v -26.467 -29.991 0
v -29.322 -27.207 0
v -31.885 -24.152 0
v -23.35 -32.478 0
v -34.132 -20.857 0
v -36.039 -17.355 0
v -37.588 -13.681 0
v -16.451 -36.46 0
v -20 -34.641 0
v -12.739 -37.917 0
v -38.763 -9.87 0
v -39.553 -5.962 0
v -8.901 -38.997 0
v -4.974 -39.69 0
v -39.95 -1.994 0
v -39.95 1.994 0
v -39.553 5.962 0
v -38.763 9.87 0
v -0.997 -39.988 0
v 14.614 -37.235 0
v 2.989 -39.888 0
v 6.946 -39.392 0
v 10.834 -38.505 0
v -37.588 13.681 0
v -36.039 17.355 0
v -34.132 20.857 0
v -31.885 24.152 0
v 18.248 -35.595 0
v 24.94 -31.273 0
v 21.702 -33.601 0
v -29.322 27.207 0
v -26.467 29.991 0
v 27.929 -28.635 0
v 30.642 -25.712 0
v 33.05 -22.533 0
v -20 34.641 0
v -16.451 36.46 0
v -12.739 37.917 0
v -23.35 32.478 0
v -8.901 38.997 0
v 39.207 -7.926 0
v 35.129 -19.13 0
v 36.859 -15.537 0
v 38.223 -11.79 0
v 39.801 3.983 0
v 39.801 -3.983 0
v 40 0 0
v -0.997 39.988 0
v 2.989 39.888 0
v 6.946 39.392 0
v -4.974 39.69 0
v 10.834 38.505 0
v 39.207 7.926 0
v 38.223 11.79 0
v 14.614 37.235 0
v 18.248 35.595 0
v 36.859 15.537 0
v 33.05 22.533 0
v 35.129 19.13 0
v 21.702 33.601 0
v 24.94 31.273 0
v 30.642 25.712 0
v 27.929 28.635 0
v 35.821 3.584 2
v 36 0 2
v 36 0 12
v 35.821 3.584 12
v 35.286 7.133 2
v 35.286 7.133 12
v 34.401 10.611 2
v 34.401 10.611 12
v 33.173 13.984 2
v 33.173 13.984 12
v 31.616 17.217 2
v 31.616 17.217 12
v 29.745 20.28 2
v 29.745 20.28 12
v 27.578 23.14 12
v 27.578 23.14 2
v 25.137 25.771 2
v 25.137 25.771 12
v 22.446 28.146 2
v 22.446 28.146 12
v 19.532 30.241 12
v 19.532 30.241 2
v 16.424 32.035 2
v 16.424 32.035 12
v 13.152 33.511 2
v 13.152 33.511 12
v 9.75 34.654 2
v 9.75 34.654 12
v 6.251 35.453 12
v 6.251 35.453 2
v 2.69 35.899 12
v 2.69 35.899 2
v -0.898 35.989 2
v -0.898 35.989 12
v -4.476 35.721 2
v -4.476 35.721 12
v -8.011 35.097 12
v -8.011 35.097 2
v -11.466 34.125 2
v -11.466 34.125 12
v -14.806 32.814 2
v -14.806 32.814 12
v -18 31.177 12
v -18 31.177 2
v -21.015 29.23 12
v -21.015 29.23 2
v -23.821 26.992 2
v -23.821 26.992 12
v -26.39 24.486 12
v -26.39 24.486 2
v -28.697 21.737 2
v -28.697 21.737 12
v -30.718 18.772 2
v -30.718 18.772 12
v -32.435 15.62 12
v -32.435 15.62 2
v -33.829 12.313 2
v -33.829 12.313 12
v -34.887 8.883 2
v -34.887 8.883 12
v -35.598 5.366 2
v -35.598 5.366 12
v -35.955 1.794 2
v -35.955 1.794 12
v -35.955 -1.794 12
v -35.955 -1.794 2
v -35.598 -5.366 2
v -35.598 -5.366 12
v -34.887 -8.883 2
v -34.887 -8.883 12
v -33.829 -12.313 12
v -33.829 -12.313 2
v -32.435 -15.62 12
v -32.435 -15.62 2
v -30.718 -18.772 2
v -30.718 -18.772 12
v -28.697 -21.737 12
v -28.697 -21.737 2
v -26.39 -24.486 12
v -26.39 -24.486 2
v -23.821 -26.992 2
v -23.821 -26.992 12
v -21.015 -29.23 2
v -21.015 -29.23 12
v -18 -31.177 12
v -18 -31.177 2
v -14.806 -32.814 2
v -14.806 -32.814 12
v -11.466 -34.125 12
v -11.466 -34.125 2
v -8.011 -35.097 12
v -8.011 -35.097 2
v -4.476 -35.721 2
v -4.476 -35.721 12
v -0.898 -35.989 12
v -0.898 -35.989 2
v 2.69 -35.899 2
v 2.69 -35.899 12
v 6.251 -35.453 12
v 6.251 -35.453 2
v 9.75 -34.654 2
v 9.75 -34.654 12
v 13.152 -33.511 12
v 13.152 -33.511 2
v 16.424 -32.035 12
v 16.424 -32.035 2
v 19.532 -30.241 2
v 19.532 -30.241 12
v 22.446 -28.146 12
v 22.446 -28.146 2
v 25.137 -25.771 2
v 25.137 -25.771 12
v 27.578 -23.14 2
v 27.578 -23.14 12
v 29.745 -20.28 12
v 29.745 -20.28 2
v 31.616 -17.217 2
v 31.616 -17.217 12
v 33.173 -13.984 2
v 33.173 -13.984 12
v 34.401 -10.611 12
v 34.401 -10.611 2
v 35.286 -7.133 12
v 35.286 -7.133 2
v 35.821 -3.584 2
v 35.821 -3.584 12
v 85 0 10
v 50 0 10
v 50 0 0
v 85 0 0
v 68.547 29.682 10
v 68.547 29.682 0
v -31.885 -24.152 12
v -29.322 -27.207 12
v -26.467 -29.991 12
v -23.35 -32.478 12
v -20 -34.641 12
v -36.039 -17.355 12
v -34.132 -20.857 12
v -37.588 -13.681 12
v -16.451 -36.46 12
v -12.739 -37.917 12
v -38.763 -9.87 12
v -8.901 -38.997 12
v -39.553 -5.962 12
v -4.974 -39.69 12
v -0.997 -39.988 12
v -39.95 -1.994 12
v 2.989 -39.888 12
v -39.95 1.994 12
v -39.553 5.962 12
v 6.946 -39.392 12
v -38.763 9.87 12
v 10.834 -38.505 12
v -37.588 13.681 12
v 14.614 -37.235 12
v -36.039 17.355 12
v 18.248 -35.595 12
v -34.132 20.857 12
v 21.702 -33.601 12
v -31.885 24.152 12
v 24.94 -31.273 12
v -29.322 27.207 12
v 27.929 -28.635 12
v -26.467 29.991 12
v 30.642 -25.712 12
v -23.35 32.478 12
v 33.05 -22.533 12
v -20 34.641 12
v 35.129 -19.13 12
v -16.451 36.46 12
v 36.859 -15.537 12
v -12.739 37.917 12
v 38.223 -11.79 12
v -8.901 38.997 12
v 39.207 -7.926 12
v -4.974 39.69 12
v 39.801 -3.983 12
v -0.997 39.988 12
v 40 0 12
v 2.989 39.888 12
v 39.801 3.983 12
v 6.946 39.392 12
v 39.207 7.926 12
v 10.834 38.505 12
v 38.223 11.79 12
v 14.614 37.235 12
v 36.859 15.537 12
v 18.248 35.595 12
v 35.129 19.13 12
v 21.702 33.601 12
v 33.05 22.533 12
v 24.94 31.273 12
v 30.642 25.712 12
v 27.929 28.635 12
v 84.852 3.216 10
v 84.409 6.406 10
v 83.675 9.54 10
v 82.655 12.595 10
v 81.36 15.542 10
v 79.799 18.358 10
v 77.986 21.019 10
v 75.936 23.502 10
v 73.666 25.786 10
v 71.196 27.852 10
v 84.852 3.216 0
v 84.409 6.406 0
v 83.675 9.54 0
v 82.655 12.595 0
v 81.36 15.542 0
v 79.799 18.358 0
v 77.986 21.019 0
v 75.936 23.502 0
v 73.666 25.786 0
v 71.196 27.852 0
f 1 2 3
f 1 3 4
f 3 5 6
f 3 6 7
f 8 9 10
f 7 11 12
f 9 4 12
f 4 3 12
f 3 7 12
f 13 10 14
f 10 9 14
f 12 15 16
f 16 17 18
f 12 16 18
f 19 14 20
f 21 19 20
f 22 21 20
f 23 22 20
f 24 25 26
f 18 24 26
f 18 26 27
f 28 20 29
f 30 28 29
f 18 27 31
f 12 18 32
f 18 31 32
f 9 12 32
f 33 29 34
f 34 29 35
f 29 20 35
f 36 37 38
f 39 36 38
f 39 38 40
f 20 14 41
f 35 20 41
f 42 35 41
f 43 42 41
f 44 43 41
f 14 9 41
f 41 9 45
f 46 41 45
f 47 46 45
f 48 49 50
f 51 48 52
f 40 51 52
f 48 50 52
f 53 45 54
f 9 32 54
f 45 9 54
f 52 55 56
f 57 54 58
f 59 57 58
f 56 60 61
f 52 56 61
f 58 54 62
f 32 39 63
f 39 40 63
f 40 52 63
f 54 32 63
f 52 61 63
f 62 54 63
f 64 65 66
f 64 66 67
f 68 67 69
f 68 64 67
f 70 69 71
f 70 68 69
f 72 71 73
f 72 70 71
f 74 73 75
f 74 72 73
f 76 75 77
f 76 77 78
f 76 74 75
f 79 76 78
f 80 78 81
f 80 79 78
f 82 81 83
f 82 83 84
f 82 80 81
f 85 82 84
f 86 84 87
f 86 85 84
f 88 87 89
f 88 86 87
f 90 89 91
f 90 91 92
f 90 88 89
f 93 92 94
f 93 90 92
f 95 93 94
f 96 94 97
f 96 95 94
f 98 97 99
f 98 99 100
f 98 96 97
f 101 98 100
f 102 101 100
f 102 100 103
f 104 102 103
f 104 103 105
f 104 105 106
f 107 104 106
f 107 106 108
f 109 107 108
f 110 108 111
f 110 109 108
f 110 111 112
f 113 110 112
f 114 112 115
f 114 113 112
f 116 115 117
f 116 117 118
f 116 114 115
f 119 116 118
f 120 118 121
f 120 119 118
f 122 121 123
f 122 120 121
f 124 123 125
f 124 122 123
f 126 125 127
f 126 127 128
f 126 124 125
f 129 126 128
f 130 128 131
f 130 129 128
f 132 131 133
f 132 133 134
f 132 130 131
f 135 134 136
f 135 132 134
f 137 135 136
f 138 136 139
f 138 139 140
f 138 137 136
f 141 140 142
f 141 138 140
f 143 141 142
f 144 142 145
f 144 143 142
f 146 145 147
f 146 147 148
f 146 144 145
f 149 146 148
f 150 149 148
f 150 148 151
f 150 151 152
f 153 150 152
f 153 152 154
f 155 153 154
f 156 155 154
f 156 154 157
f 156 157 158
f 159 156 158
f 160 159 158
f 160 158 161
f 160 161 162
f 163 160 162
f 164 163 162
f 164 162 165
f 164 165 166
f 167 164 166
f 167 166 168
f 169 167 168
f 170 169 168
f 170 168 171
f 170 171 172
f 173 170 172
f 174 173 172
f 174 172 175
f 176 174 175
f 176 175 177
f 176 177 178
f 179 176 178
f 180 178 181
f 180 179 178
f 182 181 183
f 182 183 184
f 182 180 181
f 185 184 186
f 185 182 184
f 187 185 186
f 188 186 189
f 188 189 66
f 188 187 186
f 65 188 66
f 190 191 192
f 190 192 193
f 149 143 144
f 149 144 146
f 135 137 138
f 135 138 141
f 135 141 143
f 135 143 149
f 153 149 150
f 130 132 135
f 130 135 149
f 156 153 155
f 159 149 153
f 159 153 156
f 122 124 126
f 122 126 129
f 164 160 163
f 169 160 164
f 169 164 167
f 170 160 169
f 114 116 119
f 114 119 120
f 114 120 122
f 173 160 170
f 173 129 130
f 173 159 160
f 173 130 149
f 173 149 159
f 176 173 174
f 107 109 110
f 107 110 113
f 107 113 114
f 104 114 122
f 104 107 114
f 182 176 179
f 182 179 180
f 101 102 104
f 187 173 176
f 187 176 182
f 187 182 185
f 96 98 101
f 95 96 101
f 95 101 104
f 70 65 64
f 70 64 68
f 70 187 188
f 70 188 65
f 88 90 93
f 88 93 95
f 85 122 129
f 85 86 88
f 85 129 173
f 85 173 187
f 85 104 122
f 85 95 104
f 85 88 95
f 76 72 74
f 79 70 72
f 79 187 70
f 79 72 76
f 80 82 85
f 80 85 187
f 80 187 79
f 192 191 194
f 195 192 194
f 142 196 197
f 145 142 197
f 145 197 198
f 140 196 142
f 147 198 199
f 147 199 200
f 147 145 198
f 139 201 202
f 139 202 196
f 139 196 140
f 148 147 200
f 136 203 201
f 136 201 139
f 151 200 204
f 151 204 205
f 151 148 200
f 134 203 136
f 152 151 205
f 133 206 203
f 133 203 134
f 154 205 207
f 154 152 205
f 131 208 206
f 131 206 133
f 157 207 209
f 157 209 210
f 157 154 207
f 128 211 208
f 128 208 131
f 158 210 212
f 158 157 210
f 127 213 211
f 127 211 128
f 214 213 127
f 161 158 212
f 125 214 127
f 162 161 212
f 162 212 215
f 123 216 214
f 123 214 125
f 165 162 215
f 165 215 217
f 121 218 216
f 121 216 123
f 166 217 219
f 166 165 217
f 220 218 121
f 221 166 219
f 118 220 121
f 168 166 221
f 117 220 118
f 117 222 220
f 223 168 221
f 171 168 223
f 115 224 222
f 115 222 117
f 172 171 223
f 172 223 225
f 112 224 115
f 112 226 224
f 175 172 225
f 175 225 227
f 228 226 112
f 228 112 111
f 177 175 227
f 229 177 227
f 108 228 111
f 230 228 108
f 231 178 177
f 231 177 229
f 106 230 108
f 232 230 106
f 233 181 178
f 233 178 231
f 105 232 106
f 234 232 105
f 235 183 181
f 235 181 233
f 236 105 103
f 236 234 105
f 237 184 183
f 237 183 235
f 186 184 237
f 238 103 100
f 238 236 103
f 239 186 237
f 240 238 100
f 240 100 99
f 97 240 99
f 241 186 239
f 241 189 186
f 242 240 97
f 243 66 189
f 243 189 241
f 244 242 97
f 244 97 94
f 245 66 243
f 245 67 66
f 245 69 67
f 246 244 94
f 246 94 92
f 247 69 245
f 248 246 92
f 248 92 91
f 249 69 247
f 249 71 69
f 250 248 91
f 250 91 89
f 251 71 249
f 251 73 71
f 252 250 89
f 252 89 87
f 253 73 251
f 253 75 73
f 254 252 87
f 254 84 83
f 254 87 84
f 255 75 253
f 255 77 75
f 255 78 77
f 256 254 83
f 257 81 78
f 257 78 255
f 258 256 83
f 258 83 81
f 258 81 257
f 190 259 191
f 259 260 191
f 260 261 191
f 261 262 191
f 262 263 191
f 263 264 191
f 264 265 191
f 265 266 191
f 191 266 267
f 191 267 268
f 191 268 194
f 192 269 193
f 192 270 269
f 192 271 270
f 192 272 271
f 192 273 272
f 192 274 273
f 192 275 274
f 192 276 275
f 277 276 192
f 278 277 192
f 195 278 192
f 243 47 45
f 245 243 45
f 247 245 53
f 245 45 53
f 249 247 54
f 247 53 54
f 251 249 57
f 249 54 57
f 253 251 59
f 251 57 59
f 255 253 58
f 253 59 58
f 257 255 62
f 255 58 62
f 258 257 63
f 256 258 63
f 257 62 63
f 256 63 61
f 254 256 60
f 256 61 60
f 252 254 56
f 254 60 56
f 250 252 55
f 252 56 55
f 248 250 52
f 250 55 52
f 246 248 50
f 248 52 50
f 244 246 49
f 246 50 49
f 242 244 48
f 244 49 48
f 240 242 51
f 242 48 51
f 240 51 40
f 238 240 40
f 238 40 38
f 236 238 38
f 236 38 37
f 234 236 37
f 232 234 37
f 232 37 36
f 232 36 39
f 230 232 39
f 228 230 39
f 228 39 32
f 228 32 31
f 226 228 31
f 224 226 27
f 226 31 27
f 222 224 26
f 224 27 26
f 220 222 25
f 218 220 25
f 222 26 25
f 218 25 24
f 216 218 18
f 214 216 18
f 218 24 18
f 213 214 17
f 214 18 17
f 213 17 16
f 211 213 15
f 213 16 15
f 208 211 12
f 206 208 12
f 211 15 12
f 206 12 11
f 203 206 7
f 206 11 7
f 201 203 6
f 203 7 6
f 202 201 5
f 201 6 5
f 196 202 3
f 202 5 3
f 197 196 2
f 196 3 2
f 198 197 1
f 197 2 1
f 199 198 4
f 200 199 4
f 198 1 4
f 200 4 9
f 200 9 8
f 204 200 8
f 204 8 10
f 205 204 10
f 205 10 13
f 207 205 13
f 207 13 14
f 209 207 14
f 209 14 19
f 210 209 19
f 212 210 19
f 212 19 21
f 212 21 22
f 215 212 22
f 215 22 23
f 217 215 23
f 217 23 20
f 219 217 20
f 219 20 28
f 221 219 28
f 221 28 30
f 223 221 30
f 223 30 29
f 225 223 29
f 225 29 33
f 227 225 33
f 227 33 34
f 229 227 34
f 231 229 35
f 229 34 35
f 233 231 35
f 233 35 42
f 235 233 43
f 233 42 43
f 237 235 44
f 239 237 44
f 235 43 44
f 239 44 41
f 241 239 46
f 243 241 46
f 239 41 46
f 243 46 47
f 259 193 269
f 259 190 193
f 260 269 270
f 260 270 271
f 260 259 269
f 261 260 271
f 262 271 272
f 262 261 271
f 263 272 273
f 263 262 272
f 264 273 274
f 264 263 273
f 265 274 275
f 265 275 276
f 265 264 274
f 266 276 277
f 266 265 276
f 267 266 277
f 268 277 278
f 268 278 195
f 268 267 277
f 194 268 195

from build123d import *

# Parameters (mm, degrees)
CYLINDER001_R     = 36
CYLINDER001_DEPTH = 10
CYLINDER_R        = 40
CYLINDER_DEPTH    = 12
CYLINDER002_W     = 35
CYLINDER002_H     = 10
CYLINDER002_ANGLE = 58


with BuildPart() as cilindro001:
    # Cylinder001 → Cylinder001 (new body)
    with BuildSketch(Plane.XY.offset(2)):
        Circle(CYLINDER001_R)
    extrude(amount=CYLINDER001_DEPTH)


with BuildPart() as cut:
    # Cylinder → Cylinder (new body)
    with BuildSketch(Plane.XY):
        Circle(CYLINDER_R)
    extrude(amount=CYLINDER_DEPTH)

    # Cut: cut Cilindro001
    add(cilindro001.part, mode=Mode.SUBTRACT)


with BuildPart() as cilindro002:
    # Cylinder002 → Cylinder002 (revolve)
    with BuildSketch(Plane(origin=(50, 0, 0), x_dir=(1, 0, 0), z_dir=(0, -1, 0))):
        with Locations((17.5, 5)):
            Rectangle(CYLINDER002_W, CYLINDER002_H)
    revolve(axis=Axis((50, 0, 0), (0, 0, 1)), revolution_arc=CYLINDER002_ANGLE)


solid = Compound([cut.part, cilindro002.part])
